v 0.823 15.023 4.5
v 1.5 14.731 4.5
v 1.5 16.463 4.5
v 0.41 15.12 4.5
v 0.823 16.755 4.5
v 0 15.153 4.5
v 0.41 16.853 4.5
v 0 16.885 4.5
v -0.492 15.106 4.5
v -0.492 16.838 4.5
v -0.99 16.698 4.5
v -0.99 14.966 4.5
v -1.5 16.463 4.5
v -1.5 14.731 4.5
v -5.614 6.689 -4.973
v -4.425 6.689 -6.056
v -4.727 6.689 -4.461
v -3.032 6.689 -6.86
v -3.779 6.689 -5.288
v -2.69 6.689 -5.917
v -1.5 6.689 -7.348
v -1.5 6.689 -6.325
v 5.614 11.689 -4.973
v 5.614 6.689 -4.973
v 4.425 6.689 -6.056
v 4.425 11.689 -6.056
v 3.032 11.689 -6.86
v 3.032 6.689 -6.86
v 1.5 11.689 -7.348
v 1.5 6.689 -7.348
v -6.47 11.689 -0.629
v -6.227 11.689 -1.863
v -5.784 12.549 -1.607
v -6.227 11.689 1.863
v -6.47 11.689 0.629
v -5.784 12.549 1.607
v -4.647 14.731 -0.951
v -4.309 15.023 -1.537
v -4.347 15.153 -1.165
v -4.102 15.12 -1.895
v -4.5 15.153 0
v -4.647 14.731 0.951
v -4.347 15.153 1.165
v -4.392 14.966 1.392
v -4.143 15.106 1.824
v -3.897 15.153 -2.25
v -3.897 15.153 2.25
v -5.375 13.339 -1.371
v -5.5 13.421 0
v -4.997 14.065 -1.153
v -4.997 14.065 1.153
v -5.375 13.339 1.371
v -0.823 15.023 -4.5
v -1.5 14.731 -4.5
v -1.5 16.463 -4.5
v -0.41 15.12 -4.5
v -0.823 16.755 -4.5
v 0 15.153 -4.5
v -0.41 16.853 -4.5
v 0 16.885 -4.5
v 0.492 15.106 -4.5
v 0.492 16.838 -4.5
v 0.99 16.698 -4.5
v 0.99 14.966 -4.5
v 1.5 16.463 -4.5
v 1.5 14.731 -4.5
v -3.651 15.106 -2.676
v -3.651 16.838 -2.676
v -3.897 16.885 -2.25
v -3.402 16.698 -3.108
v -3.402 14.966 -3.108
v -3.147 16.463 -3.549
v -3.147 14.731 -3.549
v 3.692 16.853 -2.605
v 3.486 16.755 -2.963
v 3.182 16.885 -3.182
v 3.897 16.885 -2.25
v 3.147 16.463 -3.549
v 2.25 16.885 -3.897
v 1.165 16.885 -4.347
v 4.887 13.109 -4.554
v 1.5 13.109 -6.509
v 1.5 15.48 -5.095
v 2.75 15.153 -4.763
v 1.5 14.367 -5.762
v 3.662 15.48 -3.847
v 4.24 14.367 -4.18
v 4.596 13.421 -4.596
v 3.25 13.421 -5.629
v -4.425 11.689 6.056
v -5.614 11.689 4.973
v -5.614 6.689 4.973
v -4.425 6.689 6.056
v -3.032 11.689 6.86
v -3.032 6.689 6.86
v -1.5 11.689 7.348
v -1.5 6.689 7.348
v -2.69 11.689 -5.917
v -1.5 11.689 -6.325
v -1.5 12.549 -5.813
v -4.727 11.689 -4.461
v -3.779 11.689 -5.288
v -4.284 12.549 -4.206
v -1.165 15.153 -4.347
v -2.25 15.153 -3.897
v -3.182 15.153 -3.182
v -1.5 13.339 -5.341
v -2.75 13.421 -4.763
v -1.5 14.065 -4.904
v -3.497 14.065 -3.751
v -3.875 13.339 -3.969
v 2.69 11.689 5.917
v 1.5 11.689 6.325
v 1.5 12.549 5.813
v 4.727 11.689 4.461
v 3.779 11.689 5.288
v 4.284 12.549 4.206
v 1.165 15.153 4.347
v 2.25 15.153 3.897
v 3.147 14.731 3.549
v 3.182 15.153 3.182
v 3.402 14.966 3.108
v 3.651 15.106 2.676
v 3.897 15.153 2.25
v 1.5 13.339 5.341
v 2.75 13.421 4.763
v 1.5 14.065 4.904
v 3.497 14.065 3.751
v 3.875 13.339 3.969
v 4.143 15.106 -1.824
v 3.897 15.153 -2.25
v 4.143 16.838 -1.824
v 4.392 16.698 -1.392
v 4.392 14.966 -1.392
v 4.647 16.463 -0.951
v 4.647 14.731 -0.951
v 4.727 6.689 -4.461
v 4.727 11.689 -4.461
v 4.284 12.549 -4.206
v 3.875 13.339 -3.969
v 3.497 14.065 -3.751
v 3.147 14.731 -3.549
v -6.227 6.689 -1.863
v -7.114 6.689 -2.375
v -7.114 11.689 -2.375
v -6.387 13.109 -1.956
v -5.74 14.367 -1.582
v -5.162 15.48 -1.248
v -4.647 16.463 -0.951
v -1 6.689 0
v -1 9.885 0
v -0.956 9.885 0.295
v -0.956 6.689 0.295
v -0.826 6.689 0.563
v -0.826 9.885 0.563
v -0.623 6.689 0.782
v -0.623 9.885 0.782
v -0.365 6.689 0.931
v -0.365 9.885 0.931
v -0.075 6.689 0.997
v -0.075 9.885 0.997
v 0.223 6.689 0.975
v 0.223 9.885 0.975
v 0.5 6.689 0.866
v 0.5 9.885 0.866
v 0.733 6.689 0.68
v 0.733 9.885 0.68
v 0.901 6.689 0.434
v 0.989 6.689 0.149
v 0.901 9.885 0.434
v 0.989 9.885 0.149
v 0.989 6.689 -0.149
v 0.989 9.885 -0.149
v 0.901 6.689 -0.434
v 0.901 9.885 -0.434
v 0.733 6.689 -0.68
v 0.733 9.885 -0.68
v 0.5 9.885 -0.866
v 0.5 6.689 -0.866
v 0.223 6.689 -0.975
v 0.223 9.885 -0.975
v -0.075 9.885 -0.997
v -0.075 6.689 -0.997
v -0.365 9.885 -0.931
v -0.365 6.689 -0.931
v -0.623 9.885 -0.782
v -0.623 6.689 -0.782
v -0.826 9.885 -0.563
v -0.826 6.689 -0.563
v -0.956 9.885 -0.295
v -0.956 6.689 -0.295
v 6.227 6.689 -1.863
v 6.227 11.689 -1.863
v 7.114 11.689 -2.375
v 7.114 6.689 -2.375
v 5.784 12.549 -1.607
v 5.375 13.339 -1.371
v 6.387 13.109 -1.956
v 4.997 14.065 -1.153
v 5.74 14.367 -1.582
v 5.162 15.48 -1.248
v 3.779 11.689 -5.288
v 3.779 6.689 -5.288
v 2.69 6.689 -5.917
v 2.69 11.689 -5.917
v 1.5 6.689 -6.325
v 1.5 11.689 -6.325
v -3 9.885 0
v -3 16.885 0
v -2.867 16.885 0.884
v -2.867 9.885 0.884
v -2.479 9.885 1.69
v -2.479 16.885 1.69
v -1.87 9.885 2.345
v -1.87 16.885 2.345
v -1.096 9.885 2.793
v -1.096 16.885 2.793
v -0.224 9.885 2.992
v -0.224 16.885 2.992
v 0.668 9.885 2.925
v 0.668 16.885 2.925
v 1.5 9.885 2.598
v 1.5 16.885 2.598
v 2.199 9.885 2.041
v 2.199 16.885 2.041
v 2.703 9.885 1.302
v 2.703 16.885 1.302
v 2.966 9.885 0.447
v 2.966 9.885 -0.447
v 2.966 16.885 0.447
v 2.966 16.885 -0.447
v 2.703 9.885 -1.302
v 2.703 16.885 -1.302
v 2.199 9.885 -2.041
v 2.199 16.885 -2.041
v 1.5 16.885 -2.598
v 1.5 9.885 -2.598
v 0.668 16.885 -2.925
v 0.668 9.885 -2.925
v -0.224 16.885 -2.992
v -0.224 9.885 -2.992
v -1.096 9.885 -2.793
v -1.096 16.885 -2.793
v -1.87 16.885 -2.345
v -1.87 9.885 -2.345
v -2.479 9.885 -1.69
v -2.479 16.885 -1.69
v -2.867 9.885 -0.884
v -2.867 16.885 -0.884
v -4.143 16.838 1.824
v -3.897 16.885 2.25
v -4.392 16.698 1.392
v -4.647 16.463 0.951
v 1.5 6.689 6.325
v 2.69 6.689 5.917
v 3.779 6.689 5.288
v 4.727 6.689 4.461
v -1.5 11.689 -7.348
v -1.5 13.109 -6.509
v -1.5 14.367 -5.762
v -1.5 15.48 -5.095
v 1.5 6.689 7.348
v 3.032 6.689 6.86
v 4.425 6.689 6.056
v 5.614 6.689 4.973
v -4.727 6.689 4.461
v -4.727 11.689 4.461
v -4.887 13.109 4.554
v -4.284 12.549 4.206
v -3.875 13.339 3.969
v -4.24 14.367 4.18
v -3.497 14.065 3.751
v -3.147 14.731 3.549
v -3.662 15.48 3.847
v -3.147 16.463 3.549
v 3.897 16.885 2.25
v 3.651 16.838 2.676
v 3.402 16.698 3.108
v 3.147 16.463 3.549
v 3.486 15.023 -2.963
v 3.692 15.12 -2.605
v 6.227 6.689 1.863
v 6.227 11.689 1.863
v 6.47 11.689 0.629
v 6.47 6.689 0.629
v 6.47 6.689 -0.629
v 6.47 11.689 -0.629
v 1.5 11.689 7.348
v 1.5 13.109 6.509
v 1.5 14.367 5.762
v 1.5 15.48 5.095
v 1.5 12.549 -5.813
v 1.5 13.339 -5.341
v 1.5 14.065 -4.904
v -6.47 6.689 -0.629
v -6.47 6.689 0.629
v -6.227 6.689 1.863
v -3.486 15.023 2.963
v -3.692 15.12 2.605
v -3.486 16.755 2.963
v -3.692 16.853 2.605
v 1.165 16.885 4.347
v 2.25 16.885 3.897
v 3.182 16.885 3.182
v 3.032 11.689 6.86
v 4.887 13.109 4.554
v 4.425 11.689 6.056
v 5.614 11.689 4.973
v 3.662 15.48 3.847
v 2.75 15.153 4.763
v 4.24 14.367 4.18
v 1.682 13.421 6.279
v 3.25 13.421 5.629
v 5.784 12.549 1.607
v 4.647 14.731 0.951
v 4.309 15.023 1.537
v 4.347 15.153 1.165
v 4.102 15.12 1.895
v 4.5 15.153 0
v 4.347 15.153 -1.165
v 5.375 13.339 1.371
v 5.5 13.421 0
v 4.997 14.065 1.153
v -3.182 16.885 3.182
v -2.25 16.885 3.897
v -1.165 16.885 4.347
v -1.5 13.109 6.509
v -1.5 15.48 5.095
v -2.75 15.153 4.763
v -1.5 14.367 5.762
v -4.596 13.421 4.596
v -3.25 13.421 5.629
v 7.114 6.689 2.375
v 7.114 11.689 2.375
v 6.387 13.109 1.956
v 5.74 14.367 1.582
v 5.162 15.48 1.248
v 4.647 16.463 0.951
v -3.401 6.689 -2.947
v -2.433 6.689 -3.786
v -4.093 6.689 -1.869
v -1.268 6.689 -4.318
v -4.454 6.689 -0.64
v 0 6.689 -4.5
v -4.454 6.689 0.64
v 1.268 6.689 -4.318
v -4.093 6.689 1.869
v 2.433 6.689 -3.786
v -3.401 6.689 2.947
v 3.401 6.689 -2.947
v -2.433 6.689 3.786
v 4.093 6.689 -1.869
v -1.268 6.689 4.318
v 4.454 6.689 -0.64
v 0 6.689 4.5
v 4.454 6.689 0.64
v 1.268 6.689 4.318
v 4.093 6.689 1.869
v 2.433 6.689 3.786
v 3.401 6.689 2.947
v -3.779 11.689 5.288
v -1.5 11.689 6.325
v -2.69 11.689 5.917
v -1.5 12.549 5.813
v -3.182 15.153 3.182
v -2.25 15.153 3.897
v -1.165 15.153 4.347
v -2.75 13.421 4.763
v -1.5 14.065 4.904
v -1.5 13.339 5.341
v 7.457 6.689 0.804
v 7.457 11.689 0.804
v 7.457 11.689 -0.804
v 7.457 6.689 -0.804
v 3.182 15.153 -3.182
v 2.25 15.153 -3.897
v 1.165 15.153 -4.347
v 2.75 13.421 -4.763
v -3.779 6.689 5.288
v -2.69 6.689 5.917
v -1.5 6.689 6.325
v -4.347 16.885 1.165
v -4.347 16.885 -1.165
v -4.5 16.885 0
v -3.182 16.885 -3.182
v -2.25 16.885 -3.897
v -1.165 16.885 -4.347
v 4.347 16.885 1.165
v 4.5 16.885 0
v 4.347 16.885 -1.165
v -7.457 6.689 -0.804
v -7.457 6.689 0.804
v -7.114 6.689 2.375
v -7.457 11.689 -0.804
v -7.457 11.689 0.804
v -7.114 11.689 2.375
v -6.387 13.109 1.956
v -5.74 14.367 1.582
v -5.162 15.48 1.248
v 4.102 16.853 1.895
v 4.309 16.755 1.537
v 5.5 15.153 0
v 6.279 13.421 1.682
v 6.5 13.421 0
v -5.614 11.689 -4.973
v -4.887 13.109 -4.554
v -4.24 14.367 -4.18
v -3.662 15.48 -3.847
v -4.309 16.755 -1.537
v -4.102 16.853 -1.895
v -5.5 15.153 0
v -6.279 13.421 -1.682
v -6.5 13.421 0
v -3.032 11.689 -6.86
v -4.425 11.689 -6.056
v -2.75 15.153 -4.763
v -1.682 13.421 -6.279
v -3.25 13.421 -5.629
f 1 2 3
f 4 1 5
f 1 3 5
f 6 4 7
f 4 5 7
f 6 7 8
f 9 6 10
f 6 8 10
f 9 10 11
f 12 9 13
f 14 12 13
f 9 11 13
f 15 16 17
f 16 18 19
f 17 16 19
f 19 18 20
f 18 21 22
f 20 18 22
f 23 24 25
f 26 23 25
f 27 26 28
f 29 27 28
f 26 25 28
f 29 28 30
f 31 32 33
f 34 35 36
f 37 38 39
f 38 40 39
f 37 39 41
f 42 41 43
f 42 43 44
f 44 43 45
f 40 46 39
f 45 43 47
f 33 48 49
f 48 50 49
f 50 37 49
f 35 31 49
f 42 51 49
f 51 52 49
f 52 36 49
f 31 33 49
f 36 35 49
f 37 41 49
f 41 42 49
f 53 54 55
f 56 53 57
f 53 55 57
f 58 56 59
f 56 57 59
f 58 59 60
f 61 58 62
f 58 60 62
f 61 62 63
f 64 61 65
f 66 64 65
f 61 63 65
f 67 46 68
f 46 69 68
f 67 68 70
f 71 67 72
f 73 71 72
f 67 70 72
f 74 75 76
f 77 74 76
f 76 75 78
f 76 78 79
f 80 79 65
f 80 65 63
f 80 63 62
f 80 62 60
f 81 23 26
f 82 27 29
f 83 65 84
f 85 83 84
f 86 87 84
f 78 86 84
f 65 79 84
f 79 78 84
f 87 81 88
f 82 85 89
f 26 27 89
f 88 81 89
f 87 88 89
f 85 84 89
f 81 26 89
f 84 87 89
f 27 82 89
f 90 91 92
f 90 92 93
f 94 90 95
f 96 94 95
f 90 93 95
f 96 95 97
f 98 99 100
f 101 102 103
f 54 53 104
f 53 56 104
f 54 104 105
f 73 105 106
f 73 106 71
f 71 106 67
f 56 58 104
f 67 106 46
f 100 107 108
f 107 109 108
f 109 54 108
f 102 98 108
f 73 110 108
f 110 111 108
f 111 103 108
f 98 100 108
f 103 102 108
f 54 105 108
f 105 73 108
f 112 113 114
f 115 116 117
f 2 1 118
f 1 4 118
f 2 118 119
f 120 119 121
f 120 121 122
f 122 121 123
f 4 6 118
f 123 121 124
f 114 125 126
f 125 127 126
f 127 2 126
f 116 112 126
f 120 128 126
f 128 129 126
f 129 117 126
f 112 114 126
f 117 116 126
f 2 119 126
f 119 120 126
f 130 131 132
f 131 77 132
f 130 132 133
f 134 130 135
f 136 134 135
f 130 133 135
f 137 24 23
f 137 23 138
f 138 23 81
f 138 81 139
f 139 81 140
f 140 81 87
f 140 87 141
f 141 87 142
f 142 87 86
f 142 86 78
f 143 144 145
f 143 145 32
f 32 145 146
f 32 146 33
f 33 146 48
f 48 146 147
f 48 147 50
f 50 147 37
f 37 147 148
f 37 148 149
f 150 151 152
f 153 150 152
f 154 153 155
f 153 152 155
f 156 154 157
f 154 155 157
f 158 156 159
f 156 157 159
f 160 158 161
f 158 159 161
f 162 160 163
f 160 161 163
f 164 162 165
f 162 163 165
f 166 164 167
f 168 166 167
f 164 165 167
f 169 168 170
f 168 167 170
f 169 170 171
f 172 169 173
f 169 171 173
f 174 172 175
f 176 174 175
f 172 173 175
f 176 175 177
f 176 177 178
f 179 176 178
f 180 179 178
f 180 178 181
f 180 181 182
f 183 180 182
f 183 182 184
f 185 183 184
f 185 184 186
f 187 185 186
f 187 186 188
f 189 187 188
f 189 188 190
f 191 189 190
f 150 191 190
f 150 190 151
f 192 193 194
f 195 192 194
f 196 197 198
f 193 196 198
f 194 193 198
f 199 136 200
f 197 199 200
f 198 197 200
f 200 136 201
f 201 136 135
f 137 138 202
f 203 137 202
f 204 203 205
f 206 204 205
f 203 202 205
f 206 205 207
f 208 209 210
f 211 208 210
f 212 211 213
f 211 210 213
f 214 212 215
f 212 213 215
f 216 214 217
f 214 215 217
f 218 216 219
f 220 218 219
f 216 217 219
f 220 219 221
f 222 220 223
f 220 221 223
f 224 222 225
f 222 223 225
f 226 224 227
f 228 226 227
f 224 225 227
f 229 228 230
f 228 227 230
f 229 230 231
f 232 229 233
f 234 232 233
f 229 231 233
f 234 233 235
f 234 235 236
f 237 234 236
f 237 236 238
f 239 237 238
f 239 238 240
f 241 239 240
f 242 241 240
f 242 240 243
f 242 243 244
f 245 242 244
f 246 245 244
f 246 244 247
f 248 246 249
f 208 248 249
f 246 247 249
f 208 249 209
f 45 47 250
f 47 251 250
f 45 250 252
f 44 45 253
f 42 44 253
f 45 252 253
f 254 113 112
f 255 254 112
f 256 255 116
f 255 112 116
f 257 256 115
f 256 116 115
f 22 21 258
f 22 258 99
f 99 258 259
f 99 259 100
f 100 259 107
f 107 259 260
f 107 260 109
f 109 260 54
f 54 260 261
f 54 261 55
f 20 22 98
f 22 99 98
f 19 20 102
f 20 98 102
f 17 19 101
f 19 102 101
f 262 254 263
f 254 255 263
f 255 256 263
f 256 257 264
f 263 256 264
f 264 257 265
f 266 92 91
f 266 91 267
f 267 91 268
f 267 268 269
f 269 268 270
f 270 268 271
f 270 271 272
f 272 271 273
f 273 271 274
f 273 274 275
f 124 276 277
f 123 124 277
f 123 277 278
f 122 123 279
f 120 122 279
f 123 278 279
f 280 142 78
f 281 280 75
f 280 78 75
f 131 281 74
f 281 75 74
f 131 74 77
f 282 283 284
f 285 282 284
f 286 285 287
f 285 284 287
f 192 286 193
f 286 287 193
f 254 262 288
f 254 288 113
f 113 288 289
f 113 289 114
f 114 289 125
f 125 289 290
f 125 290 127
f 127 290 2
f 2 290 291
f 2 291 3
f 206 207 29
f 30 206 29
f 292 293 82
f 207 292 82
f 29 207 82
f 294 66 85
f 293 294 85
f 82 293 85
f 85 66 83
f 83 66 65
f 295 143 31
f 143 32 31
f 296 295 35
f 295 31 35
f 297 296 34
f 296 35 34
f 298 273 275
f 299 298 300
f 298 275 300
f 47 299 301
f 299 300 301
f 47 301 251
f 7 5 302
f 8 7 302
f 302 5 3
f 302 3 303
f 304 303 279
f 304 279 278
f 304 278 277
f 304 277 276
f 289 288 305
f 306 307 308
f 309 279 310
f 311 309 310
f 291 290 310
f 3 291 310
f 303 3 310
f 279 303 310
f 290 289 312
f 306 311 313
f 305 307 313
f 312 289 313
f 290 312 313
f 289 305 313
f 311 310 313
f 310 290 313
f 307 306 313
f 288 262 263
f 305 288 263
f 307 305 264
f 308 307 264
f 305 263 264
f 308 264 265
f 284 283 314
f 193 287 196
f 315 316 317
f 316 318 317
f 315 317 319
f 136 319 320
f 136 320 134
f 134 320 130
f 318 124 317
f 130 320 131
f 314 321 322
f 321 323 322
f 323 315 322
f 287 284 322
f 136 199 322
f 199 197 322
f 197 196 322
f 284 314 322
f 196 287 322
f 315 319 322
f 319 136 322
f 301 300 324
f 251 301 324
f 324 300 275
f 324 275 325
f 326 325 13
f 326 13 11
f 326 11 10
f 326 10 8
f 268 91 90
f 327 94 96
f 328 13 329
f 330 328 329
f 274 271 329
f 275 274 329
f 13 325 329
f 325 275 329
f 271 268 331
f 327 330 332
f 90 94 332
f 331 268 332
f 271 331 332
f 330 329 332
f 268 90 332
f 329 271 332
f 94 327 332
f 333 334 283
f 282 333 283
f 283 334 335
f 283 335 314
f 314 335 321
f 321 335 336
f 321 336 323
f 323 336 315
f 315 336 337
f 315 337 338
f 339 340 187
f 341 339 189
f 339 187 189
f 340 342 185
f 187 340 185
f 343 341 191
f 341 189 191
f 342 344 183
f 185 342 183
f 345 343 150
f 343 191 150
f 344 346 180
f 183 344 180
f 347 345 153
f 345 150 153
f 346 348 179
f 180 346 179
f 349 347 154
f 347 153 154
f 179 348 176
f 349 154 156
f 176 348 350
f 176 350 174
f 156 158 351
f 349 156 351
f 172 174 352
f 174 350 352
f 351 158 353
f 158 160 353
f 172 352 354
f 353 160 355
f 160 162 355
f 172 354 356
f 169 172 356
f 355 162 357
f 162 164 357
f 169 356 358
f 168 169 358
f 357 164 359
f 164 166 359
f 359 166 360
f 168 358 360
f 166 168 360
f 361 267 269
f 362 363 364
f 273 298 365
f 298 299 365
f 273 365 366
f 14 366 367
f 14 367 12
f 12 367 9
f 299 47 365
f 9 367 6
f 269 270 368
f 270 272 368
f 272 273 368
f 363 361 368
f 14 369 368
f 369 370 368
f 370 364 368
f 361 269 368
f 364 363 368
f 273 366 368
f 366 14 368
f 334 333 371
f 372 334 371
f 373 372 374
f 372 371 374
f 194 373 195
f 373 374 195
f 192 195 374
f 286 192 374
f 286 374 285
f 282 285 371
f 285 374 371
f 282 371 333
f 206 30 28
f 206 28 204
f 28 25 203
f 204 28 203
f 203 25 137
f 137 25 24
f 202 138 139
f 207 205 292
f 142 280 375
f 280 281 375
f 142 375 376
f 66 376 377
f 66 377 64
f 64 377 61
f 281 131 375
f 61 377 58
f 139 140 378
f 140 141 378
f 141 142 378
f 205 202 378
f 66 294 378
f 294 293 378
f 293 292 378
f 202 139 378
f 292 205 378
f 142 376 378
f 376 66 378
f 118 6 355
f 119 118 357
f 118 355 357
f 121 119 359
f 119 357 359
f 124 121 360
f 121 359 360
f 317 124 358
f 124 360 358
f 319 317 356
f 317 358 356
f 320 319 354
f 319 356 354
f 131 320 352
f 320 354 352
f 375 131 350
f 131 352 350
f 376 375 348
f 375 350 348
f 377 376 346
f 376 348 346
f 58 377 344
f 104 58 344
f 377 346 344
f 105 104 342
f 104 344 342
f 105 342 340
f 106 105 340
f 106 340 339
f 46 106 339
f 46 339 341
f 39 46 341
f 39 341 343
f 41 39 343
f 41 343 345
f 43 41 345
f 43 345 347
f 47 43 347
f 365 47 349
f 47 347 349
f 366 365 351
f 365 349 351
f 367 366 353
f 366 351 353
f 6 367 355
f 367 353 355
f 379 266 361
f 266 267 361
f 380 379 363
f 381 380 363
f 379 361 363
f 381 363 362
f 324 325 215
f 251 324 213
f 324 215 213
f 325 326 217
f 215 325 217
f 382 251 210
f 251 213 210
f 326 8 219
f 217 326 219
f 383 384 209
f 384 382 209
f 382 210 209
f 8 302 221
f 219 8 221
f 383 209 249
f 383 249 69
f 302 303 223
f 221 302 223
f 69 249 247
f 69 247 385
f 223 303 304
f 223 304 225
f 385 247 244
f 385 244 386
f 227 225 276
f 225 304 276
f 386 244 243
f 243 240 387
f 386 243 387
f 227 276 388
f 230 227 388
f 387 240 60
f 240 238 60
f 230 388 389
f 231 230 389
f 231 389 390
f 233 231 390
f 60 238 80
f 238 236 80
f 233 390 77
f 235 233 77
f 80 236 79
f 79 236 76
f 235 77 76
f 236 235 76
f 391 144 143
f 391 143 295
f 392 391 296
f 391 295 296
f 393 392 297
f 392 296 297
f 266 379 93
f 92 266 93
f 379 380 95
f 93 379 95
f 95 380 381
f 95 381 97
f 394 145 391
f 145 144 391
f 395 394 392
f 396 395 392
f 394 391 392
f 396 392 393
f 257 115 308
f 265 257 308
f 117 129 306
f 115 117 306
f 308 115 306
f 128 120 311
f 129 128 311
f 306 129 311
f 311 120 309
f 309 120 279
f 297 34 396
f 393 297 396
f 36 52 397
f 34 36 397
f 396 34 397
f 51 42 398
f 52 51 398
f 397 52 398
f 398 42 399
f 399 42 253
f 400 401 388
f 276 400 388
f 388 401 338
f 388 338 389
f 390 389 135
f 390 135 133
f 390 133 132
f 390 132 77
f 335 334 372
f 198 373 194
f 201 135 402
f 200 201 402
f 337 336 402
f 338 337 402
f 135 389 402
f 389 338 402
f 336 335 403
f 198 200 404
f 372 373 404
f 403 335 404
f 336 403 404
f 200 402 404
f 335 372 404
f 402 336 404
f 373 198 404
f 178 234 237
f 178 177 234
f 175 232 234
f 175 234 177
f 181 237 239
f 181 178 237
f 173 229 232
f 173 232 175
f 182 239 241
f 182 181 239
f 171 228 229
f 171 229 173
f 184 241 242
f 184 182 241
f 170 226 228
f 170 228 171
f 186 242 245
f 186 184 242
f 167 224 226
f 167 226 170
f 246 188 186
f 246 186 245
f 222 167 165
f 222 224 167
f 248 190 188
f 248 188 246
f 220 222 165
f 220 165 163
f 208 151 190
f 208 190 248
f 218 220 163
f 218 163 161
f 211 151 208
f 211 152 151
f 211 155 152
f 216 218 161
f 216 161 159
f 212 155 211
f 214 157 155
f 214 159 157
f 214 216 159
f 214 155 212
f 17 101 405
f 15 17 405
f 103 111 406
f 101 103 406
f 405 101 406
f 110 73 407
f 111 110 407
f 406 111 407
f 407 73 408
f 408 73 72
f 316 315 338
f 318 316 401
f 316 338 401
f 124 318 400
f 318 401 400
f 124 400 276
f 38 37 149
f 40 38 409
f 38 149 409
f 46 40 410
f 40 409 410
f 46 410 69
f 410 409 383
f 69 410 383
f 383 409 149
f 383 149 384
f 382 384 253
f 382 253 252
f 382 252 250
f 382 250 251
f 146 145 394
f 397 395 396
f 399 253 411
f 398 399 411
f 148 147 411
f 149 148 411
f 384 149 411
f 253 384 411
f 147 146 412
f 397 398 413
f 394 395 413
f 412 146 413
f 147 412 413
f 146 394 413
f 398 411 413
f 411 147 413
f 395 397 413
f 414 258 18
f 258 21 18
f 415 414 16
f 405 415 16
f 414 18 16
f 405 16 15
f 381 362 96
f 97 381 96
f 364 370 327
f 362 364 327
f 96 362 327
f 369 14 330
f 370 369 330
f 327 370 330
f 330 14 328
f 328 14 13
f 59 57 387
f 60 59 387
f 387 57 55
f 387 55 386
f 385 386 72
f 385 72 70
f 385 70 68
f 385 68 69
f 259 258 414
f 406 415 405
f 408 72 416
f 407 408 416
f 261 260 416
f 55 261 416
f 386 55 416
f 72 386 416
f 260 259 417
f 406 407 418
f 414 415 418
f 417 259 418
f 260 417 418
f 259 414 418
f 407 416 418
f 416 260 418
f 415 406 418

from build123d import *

# Parameters (mm, degrees)
F3_DEPTH = 25
F4_R     = 3
F5_DEPTH = 7
F6_R     = 1
F7_DEPTH = 25


# Not quite as in the source:
# - a feature names something its author has since deleted; it is built from what else it names


with BuildPart() as f1:
    # F0 (on Right) → F1 (revolve)
    with BuildSketch(Plane.YZ):
        Polygon((6.6886462844, 0), (16.8847987071, 0), (16.8847987071, 4.5), (11.6886462844, 7.5), (6.6886462844, 7.5), (6.6886462844, 6.5), (11.6886462844, 6.5), (15.1527478995, 4.5), (6.6886462844, 4.5), align=None)
    revolve(axis=Axis((0, 8.4423993535, 0), (0, 1, 0)))

    # F2 (on face) → F3 (cut)
    with BuildSketch(Plane(origin=(0, 16.8847987071, 0), x_dir=(-1, 0, 0), z_dir=(0, 1, 0))):
        with BuildLine():
            ThreePointArc((-7.1139610307, -2.3751965085), (-6.4951905284, -3.75), (-5.6139610307, -4.9732727199))
            Line((-5.6139610307, -4.9732727199), (-3.147114317, -3.5490381057))
            Line((-3.147114317, -3.5490381057), (-3.8971148018, -2.2499991604))
            Line((-3.8971148018, -2.2499991604), (-4.647114317, -0.9509618943))
            Line((-4.647114317, -0.9509618943), (-7.1139610307, -2.3751965085))
        make_face()
        with BuildLine():
            Line((-3.147114317, 3.5490381057), (-5.6139610307, 4.9732727199))
            ThreePointArc((-5.6139610307, 4.9732727199), (-6.4951905284, 3.75), (-7.1139610307, 2.3751965085))
            Line((-7.1139610307, 2.3751965085), (-4.647114317, 0.9509618943))
            Line((-4.647114317, 0.9509618943), (-3.8971148073, 2.2499991508))
            Line((-3.8971148073, 2.2499991508), (-3.147114317, 3.5490381057))
        make_face()
        with BuildLine():
            Line((1.5, 4.5), (1.5, 7.3484692283))
            ThreePointArc((1.5, 7.3484692283), (0, 7.5), (-1.5, 7.3484692283))
            Line((-1.5, 7.3484692283), (-1.5, 4.5))
            Line((-1.5, 4.5), (0, 4.5))
            Line((0, 4.5), (1.5, 4.5))
        make_face()
        with BuildLine():
            Line((4.647114317, 0.9509618943), (7.1139610307, 2.3751965085))
            ThreePointArc((7.1139610307, 2.3751965085), (6.4951905284, 3.75), (5.6139610307, 4.9732727199))
            Line((5.6139610307, 4.9732727199), (3.147114317, 3.5490381057))
            Line((3.147114317, 3.5490381057), (3.8971147984, 2.2499991663))
            Line((3.8971147984, 2.2499991663), (4.647114317, 0.9509618943))
        make_face()
        with BuildLine():
            ThreePointArc((5.6139610307, -4.9732727199), (6.4951905284, -3.75), (7.1139610307, -2.3751965085))
            Line((7.1139610307, -2.3751965085), (4.647114317, -0.9509618943))
            Line((4.647114317, -0.9509618943), (3.8971147929, -2.2499991758))
            Line((3.8971147929, -2.2499991758), (3.147114317, -3.5490381057))
            Line((3.147114317, -3.5490381057), (5.6139610307, -4.9732727199))
        make_face()
        with BuildLine():
            ThreePointArc((-1.5, -7.3484692283), (0, -7.5), (1.5, -7.3484692283))
            Line((1.5, -7.3484692283), (1.5, -4.5))
            Line((1.5, -4.5), (0, -4.5))
            Line((0, -4.5), (-1.5, -4.5))
            Line((-1.5, -4.5), (-1.5, -7.3484692283))
        make_face()
    extrude(amount=-F3_DEPTH, mode=Mode.SUBTRACT)

    # F4 (on face) → F5 (cut)
    with BuildSketch(Plane(origin=(0, 16.8847987071, 0), x_dir=(-1, 0, 0), z_dir=(0, 1, 0))):
        Circle(F4_R)
    extrude(amount=-F5_DEPTH, mode=Mode.SUBTRACT)

    # F6 (on face) → F7 (cut)
    with BuildSketch(Plane(origin=(0, 9.8847987071, 0), x_dir=(-1, 0, 0), z_dir=(0, 1, 0))):
        Circle(F6_R)
    extrude(amount=-F7_DEPTH, mode=Mode.SUBTRACT)


solid = f1.part
